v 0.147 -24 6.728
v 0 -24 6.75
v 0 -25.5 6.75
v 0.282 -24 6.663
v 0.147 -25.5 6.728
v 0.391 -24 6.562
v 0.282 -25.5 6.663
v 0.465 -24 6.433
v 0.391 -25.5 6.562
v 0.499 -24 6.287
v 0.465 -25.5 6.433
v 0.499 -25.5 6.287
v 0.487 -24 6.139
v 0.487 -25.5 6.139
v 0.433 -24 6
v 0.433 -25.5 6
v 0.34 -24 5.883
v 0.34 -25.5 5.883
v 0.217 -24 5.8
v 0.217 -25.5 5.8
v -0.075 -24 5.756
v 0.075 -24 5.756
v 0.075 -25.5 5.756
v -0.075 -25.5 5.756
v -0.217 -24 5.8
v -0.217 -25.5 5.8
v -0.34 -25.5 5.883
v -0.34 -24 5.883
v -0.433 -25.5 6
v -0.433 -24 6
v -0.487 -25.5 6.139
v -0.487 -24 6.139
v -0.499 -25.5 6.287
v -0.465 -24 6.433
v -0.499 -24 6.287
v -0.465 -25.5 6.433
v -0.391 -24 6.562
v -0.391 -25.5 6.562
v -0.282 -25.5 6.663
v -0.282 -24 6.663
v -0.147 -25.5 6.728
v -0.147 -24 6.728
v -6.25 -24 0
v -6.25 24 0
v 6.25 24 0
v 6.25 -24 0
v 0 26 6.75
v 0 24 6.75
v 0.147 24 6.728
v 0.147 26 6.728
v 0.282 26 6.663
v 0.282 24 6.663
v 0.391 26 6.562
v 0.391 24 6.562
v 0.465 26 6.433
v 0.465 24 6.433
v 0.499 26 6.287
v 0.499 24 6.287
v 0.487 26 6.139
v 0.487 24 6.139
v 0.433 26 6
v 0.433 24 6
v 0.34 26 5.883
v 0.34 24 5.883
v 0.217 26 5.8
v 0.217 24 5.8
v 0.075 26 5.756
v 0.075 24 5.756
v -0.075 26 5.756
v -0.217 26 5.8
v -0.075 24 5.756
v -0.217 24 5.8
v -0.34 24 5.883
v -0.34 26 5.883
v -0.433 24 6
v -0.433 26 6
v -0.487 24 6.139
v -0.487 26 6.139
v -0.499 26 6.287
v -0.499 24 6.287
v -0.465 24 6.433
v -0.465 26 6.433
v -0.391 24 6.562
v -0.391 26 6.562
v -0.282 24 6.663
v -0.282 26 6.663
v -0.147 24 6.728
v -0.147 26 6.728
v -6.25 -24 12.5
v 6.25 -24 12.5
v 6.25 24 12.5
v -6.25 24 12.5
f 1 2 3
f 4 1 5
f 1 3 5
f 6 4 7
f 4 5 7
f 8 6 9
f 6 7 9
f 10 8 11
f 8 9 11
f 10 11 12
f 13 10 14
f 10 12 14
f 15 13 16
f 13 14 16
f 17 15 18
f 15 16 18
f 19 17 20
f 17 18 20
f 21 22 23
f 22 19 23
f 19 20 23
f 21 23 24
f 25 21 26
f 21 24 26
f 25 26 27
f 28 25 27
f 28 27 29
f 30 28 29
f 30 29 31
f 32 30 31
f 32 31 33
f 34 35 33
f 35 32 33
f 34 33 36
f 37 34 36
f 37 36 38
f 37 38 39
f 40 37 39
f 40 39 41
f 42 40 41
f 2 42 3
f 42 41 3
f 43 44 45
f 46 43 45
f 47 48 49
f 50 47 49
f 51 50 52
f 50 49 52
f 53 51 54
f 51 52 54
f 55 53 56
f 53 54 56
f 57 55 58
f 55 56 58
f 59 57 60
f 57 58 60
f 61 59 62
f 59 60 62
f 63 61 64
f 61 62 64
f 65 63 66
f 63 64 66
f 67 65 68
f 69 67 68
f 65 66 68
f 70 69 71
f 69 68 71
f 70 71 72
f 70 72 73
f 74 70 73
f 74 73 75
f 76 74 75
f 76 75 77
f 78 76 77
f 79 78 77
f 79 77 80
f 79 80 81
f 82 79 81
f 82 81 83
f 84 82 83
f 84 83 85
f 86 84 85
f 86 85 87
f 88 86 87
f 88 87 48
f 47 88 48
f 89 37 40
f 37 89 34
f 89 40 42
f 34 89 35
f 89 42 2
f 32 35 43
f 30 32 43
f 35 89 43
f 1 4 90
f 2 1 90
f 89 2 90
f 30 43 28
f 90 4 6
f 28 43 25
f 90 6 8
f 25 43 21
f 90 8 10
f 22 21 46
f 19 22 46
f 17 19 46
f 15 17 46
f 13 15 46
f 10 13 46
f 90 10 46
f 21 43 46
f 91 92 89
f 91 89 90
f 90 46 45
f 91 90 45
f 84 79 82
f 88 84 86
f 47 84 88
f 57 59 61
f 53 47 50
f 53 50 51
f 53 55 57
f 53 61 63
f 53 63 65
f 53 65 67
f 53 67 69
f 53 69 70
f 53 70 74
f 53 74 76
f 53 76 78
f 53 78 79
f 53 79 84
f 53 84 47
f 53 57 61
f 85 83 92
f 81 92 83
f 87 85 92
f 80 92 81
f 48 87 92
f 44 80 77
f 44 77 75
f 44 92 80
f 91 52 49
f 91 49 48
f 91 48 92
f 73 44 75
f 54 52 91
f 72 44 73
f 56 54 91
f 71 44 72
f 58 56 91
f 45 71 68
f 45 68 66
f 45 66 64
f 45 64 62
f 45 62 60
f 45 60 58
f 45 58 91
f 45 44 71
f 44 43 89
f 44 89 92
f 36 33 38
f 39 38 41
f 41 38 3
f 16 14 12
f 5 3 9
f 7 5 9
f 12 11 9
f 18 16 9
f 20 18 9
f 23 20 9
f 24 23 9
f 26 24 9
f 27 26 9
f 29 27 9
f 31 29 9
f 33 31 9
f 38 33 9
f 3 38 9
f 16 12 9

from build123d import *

# Parameters (mm, degrees)
SKETCH_1_W           = 12.5
SKETCH_1_H           = 48
EXTRUDE_1_DEPTH      = 12.5
EXTRUDE_2_DEPTH      = 2
EXTRUDE_2_DEPTH_BACK = 49.5
SKETCH_2_R           = 0.5


with BuildPart() as part:
    # 草图1 → 凸台-拉伸1 (new body)
    with BuildSketch(Plane.XY):
        Rectangle(SKETCH_1_W, SKETCH_1_H)
    extrude(amount=EXTRUDE_1_DEPTH)

    # 草图2 → 凸台-拉伸2 (add, two sides: drawn at the far end of the back side and taken through both)
    with BuildSketch(Plane(origin=(0, 24, 0), x_dir=(1, 0, 0), z_dir=(0, 1, 0)).offset(-EXTRUDE_2_DEPTH_BACK)):
        with Locations(Location((0, -6.25, 0), (0, 0, 270))):
            Circle(SKETCH_2_R)
    extrude(amount=EXTRUDE_2_DEPTH + EXTRUDE_2_DEPTH_BACK)


solid = part.part
